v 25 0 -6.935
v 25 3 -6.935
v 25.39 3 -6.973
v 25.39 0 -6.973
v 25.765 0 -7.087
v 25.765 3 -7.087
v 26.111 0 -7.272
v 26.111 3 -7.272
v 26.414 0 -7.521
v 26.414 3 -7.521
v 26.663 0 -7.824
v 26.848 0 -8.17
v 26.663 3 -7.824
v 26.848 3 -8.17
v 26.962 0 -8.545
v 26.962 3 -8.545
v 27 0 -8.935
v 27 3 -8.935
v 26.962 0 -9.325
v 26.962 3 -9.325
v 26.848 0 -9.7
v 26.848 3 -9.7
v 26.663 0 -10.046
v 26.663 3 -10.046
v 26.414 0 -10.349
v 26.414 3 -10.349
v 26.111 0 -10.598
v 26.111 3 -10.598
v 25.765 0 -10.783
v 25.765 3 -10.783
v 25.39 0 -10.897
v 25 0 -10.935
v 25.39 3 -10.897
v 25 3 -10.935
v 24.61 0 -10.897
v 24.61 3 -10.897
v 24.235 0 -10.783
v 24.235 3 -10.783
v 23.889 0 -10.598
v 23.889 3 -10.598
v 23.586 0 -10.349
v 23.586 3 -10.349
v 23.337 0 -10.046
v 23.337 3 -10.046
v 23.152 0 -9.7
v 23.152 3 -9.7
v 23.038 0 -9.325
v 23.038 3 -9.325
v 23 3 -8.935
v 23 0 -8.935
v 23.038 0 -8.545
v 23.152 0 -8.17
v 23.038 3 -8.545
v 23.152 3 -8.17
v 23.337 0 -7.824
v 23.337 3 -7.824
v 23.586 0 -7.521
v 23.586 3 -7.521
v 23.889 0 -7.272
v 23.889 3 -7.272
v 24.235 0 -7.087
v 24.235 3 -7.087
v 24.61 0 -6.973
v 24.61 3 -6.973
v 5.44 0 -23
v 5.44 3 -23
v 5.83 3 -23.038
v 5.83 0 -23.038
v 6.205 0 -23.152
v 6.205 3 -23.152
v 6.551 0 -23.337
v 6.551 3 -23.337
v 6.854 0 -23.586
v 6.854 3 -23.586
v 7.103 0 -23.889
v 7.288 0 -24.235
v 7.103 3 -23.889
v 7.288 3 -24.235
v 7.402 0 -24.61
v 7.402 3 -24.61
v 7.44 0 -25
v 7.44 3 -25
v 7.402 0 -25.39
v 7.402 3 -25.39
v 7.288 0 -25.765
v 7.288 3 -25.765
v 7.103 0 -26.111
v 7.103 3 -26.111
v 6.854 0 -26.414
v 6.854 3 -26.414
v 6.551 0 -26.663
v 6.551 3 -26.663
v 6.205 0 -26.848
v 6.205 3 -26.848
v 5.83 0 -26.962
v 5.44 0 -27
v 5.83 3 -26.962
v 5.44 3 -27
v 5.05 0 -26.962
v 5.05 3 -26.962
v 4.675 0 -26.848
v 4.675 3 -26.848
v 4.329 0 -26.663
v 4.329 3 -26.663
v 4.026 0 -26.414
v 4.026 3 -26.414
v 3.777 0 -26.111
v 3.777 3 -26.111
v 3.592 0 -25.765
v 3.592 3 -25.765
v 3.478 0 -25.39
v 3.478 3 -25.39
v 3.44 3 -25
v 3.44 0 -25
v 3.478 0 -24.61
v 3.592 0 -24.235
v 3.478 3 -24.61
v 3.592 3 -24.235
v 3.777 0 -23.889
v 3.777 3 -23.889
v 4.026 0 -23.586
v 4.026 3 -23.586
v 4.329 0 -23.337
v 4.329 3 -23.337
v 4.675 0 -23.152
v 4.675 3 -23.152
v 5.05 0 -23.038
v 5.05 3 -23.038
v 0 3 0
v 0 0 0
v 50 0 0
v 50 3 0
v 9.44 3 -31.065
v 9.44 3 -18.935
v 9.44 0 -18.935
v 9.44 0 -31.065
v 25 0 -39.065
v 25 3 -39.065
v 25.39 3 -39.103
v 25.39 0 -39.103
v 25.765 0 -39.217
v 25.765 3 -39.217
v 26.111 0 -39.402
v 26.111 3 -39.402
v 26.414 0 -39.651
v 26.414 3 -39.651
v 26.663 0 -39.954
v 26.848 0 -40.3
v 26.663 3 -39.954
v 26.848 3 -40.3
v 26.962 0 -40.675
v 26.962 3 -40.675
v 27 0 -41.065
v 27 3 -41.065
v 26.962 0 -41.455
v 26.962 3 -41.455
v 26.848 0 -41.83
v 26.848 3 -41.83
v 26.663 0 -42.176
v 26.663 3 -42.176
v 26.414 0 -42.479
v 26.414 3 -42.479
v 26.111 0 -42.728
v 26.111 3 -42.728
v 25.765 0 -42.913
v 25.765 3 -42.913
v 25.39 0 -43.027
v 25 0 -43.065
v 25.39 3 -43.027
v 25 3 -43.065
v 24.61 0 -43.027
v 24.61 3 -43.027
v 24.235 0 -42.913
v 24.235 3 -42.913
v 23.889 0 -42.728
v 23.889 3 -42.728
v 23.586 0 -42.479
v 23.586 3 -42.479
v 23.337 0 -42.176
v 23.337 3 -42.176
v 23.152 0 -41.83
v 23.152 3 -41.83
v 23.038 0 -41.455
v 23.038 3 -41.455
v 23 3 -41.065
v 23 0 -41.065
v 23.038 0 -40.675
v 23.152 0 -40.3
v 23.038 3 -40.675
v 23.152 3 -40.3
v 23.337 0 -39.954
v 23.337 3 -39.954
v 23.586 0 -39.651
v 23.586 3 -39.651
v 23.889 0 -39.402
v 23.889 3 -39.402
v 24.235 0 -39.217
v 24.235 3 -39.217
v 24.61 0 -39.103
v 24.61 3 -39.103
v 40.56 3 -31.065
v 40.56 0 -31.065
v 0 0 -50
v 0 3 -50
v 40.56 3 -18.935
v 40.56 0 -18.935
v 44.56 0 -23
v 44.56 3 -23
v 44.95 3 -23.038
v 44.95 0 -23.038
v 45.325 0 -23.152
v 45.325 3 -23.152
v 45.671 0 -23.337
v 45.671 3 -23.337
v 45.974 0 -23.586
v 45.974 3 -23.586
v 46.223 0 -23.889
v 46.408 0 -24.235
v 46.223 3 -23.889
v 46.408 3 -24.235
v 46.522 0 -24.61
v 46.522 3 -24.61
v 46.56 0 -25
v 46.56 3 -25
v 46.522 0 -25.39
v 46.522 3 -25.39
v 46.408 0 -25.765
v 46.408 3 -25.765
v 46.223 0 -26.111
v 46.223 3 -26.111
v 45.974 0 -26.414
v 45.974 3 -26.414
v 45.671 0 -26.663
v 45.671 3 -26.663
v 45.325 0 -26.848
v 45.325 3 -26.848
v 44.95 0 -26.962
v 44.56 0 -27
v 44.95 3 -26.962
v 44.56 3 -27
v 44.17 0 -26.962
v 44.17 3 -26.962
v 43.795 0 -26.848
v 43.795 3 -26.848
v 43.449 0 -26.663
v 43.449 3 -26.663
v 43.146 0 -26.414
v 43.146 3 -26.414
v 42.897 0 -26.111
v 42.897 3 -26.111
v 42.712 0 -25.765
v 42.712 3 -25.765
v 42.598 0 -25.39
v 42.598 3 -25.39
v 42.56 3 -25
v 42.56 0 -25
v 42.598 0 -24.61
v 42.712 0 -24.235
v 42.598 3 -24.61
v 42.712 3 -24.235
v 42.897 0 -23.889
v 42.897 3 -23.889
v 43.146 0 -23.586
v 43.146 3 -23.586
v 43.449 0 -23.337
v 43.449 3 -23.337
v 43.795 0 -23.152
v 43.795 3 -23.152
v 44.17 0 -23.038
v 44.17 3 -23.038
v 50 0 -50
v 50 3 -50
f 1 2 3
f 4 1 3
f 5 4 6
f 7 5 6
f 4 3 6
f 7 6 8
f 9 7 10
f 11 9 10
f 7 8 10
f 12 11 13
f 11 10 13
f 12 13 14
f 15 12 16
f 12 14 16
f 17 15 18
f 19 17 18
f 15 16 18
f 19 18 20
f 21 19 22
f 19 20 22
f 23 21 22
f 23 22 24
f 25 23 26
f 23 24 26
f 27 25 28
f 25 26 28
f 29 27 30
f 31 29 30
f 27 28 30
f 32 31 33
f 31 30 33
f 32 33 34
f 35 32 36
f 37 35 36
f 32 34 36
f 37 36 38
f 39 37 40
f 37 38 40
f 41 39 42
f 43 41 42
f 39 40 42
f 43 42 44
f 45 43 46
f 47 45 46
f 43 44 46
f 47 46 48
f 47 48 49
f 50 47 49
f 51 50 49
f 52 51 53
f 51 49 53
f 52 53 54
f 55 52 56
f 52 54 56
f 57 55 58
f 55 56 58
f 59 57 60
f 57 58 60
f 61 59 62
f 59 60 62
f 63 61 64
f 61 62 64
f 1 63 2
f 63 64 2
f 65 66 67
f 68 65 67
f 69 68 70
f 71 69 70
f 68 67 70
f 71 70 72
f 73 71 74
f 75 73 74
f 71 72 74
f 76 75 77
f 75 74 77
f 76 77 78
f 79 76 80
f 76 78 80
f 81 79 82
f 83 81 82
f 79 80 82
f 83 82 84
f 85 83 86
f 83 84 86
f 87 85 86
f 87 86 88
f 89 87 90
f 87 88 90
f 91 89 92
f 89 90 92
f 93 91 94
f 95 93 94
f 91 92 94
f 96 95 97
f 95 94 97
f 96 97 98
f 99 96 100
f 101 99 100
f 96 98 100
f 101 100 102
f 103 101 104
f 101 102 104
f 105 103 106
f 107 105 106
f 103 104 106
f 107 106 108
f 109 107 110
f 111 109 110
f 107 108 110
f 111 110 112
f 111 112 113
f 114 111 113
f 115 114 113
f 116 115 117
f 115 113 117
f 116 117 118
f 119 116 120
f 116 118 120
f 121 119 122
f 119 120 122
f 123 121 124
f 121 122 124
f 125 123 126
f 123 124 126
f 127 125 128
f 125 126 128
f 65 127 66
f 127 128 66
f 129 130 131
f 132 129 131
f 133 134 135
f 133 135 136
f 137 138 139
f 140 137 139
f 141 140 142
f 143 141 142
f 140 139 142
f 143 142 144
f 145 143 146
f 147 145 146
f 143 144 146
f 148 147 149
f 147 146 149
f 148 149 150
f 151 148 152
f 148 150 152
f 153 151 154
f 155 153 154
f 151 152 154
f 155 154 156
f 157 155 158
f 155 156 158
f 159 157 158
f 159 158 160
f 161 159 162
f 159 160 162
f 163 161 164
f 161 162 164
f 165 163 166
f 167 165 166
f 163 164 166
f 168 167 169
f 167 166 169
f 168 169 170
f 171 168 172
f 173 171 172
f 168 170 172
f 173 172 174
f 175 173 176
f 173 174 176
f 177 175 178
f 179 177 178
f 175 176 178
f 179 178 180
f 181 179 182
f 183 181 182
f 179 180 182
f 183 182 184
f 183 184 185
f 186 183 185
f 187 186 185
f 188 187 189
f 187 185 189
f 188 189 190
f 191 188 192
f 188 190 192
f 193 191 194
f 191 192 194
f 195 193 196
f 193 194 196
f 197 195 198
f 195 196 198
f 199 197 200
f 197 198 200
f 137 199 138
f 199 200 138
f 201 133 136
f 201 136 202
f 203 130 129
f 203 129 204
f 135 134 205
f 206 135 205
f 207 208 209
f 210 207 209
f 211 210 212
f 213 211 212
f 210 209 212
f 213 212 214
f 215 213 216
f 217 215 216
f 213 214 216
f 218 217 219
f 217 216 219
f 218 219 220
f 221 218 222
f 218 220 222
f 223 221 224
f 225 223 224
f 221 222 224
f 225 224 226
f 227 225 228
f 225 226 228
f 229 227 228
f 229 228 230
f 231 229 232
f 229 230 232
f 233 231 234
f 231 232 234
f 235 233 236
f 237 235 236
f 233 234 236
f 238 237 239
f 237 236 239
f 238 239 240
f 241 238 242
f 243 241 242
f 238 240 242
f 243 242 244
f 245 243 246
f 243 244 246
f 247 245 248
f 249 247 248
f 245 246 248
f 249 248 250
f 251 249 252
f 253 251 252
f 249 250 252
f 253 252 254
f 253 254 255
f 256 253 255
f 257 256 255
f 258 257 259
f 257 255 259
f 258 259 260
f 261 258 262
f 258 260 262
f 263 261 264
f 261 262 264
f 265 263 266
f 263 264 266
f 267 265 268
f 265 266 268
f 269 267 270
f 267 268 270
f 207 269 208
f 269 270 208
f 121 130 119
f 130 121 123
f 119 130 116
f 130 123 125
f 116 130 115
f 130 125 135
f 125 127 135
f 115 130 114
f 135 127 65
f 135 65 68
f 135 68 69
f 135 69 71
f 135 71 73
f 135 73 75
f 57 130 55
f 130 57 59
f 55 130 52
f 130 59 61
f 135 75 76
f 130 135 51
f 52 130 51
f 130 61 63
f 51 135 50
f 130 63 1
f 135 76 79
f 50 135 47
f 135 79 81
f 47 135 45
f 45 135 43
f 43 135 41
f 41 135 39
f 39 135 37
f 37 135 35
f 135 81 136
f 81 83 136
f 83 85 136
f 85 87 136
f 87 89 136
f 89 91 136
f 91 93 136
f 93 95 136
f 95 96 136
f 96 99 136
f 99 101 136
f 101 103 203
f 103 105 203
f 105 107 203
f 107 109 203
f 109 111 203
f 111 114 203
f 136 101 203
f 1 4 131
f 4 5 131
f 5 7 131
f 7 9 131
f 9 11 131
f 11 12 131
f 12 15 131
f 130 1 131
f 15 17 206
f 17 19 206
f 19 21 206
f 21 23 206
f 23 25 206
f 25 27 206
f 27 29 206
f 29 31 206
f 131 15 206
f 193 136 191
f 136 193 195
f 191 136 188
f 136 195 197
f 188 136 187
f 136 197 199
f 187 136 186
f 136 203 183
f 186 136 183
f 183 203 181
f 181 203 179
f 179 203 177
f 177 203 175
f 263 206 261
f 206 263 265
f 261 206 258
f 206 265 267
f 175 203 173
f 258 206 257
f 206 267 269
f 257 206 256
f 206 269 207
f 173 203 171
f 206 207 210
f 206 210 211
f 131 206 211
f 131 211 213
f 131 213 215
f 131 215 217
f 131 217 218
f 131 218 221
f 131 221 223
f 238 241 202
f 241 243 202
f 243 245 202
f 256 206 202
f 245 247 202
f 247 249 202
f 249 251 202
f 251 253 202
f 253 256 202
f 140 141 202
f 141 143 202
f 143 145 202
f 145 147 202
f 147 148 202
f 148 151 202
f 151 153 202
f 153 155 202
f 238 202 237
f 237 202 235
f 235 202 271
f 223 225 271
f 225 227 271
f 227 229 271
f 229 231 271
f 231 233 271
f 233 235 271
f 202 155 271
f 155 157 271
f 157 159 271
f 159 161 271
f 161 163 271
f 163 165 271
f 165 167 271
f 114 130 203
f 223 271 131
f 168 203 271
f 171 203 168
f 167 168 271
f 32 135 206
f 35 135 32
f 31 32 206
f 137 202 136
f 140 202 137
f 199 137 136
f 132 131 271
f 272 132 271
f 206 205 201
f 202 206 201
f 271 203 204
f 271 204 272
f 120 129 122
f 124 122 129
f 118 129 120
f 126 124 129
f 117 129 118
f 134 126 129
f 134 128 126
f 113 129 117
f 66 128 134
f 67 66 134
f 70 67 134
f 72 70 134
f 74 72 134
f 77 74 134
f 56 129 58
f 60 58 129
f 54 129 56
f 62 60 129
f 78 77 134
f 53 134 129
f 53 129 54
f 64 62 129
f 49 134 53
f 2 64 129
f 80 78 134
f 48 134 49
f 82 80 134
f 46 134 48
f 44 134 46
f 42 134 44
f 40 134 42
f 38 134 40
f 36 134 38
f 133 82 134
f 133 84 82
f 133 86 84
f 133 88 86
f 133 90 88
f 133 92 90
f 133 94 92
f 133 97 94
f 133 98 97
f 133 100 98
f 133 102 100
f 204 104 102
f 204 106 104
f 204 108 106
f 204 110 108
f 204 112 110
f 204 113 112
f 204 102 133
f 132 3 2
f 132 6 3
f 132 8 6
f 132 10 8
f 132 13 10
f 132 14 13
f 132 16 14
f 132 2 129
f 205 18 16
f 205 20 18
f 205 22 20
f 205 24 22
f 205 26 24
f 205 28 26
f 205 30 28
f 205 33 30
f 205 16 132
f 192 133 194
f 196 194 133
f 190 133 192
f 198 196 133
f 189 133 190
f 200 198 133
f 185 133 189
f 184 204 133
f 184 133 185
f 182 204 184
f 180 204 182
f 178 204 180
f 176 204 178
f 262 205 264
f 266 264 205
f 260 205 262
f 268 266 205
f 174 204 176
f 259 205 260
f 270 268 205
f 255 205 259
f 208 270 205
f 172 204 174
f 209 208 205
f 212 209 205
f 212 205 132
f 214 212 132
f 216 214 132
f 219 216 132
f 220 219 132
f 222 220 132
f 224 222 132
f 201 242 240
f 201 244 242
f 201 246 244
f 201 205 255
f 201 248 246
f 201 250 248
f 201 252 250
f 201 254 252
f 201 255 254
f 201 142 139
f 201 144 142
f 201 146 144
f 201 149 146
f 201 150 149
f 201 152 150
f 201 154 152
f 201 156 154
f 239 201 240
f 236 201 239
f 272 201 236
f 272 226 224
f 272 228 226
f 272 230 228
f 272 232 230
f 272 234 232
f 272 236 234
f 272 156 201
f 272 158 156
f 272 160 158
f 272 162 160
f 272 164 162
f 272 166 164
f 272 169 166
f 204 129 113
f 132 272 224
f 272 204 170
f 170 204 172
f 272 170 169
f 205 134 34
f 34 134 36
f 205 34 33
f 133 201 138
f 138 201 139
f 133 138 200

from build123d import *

# Parameters (mm, degrees)
ESBO_O1_W             = 50
ESBO_O1_H             = 50
BASE_DEPTH            = 3
ENTRADASESB_R         = 2
ENTRADASESB_W         = 31.12
ENTRADASESB_H         = 12.13
CORTE_EXTRUS_O1_DEPTH = 3


with BuildPart() as part:
    # Esboço1 → Base (new body)
    with BuildSketch(Plane(origin=(0, 0, 0), x_dir=(1, 0, 0), z_dir=(0, 1, 0))):
        with Locations((25, 25)):
            Rectangle(ESBO_O1_W, ESBO_O1_H)
    extrude(amount=BASE_DEPTH)

    # EntradasEsb → Corte-extrusão1 (cut)
    with BuildSketch(Plane(origin=(0, 3, 0), x_dir=(1, 0, 0), z_dir=(0, 1, 0))):
        with Locations(Location((25, 41.065, 0), (0, 0, 270))):
            Circle(ENTRADASESB_R)
        with Locations(Location((25, 8.935, 0), (0, 0, 270))):
            Circle(ENTRADASESB_R)
        with Locations(Location((44.56, 25, 0), (0, 0, 270))):
            Circle(ENTRADASESB_R)
        with Locations(Location((5.44, 25, 0), (0, 0, 270))):
            Circle(ENTRADASESB_R)
        with Locations((25, 25)):
            Rectangle(ENTRADASESB_W, ENTRADASESB_H)
    extrude(amount=-CORTE_EXTRUS_O1_DEPTH, mode=Mode.SUBTRACT)


solid = part.part
